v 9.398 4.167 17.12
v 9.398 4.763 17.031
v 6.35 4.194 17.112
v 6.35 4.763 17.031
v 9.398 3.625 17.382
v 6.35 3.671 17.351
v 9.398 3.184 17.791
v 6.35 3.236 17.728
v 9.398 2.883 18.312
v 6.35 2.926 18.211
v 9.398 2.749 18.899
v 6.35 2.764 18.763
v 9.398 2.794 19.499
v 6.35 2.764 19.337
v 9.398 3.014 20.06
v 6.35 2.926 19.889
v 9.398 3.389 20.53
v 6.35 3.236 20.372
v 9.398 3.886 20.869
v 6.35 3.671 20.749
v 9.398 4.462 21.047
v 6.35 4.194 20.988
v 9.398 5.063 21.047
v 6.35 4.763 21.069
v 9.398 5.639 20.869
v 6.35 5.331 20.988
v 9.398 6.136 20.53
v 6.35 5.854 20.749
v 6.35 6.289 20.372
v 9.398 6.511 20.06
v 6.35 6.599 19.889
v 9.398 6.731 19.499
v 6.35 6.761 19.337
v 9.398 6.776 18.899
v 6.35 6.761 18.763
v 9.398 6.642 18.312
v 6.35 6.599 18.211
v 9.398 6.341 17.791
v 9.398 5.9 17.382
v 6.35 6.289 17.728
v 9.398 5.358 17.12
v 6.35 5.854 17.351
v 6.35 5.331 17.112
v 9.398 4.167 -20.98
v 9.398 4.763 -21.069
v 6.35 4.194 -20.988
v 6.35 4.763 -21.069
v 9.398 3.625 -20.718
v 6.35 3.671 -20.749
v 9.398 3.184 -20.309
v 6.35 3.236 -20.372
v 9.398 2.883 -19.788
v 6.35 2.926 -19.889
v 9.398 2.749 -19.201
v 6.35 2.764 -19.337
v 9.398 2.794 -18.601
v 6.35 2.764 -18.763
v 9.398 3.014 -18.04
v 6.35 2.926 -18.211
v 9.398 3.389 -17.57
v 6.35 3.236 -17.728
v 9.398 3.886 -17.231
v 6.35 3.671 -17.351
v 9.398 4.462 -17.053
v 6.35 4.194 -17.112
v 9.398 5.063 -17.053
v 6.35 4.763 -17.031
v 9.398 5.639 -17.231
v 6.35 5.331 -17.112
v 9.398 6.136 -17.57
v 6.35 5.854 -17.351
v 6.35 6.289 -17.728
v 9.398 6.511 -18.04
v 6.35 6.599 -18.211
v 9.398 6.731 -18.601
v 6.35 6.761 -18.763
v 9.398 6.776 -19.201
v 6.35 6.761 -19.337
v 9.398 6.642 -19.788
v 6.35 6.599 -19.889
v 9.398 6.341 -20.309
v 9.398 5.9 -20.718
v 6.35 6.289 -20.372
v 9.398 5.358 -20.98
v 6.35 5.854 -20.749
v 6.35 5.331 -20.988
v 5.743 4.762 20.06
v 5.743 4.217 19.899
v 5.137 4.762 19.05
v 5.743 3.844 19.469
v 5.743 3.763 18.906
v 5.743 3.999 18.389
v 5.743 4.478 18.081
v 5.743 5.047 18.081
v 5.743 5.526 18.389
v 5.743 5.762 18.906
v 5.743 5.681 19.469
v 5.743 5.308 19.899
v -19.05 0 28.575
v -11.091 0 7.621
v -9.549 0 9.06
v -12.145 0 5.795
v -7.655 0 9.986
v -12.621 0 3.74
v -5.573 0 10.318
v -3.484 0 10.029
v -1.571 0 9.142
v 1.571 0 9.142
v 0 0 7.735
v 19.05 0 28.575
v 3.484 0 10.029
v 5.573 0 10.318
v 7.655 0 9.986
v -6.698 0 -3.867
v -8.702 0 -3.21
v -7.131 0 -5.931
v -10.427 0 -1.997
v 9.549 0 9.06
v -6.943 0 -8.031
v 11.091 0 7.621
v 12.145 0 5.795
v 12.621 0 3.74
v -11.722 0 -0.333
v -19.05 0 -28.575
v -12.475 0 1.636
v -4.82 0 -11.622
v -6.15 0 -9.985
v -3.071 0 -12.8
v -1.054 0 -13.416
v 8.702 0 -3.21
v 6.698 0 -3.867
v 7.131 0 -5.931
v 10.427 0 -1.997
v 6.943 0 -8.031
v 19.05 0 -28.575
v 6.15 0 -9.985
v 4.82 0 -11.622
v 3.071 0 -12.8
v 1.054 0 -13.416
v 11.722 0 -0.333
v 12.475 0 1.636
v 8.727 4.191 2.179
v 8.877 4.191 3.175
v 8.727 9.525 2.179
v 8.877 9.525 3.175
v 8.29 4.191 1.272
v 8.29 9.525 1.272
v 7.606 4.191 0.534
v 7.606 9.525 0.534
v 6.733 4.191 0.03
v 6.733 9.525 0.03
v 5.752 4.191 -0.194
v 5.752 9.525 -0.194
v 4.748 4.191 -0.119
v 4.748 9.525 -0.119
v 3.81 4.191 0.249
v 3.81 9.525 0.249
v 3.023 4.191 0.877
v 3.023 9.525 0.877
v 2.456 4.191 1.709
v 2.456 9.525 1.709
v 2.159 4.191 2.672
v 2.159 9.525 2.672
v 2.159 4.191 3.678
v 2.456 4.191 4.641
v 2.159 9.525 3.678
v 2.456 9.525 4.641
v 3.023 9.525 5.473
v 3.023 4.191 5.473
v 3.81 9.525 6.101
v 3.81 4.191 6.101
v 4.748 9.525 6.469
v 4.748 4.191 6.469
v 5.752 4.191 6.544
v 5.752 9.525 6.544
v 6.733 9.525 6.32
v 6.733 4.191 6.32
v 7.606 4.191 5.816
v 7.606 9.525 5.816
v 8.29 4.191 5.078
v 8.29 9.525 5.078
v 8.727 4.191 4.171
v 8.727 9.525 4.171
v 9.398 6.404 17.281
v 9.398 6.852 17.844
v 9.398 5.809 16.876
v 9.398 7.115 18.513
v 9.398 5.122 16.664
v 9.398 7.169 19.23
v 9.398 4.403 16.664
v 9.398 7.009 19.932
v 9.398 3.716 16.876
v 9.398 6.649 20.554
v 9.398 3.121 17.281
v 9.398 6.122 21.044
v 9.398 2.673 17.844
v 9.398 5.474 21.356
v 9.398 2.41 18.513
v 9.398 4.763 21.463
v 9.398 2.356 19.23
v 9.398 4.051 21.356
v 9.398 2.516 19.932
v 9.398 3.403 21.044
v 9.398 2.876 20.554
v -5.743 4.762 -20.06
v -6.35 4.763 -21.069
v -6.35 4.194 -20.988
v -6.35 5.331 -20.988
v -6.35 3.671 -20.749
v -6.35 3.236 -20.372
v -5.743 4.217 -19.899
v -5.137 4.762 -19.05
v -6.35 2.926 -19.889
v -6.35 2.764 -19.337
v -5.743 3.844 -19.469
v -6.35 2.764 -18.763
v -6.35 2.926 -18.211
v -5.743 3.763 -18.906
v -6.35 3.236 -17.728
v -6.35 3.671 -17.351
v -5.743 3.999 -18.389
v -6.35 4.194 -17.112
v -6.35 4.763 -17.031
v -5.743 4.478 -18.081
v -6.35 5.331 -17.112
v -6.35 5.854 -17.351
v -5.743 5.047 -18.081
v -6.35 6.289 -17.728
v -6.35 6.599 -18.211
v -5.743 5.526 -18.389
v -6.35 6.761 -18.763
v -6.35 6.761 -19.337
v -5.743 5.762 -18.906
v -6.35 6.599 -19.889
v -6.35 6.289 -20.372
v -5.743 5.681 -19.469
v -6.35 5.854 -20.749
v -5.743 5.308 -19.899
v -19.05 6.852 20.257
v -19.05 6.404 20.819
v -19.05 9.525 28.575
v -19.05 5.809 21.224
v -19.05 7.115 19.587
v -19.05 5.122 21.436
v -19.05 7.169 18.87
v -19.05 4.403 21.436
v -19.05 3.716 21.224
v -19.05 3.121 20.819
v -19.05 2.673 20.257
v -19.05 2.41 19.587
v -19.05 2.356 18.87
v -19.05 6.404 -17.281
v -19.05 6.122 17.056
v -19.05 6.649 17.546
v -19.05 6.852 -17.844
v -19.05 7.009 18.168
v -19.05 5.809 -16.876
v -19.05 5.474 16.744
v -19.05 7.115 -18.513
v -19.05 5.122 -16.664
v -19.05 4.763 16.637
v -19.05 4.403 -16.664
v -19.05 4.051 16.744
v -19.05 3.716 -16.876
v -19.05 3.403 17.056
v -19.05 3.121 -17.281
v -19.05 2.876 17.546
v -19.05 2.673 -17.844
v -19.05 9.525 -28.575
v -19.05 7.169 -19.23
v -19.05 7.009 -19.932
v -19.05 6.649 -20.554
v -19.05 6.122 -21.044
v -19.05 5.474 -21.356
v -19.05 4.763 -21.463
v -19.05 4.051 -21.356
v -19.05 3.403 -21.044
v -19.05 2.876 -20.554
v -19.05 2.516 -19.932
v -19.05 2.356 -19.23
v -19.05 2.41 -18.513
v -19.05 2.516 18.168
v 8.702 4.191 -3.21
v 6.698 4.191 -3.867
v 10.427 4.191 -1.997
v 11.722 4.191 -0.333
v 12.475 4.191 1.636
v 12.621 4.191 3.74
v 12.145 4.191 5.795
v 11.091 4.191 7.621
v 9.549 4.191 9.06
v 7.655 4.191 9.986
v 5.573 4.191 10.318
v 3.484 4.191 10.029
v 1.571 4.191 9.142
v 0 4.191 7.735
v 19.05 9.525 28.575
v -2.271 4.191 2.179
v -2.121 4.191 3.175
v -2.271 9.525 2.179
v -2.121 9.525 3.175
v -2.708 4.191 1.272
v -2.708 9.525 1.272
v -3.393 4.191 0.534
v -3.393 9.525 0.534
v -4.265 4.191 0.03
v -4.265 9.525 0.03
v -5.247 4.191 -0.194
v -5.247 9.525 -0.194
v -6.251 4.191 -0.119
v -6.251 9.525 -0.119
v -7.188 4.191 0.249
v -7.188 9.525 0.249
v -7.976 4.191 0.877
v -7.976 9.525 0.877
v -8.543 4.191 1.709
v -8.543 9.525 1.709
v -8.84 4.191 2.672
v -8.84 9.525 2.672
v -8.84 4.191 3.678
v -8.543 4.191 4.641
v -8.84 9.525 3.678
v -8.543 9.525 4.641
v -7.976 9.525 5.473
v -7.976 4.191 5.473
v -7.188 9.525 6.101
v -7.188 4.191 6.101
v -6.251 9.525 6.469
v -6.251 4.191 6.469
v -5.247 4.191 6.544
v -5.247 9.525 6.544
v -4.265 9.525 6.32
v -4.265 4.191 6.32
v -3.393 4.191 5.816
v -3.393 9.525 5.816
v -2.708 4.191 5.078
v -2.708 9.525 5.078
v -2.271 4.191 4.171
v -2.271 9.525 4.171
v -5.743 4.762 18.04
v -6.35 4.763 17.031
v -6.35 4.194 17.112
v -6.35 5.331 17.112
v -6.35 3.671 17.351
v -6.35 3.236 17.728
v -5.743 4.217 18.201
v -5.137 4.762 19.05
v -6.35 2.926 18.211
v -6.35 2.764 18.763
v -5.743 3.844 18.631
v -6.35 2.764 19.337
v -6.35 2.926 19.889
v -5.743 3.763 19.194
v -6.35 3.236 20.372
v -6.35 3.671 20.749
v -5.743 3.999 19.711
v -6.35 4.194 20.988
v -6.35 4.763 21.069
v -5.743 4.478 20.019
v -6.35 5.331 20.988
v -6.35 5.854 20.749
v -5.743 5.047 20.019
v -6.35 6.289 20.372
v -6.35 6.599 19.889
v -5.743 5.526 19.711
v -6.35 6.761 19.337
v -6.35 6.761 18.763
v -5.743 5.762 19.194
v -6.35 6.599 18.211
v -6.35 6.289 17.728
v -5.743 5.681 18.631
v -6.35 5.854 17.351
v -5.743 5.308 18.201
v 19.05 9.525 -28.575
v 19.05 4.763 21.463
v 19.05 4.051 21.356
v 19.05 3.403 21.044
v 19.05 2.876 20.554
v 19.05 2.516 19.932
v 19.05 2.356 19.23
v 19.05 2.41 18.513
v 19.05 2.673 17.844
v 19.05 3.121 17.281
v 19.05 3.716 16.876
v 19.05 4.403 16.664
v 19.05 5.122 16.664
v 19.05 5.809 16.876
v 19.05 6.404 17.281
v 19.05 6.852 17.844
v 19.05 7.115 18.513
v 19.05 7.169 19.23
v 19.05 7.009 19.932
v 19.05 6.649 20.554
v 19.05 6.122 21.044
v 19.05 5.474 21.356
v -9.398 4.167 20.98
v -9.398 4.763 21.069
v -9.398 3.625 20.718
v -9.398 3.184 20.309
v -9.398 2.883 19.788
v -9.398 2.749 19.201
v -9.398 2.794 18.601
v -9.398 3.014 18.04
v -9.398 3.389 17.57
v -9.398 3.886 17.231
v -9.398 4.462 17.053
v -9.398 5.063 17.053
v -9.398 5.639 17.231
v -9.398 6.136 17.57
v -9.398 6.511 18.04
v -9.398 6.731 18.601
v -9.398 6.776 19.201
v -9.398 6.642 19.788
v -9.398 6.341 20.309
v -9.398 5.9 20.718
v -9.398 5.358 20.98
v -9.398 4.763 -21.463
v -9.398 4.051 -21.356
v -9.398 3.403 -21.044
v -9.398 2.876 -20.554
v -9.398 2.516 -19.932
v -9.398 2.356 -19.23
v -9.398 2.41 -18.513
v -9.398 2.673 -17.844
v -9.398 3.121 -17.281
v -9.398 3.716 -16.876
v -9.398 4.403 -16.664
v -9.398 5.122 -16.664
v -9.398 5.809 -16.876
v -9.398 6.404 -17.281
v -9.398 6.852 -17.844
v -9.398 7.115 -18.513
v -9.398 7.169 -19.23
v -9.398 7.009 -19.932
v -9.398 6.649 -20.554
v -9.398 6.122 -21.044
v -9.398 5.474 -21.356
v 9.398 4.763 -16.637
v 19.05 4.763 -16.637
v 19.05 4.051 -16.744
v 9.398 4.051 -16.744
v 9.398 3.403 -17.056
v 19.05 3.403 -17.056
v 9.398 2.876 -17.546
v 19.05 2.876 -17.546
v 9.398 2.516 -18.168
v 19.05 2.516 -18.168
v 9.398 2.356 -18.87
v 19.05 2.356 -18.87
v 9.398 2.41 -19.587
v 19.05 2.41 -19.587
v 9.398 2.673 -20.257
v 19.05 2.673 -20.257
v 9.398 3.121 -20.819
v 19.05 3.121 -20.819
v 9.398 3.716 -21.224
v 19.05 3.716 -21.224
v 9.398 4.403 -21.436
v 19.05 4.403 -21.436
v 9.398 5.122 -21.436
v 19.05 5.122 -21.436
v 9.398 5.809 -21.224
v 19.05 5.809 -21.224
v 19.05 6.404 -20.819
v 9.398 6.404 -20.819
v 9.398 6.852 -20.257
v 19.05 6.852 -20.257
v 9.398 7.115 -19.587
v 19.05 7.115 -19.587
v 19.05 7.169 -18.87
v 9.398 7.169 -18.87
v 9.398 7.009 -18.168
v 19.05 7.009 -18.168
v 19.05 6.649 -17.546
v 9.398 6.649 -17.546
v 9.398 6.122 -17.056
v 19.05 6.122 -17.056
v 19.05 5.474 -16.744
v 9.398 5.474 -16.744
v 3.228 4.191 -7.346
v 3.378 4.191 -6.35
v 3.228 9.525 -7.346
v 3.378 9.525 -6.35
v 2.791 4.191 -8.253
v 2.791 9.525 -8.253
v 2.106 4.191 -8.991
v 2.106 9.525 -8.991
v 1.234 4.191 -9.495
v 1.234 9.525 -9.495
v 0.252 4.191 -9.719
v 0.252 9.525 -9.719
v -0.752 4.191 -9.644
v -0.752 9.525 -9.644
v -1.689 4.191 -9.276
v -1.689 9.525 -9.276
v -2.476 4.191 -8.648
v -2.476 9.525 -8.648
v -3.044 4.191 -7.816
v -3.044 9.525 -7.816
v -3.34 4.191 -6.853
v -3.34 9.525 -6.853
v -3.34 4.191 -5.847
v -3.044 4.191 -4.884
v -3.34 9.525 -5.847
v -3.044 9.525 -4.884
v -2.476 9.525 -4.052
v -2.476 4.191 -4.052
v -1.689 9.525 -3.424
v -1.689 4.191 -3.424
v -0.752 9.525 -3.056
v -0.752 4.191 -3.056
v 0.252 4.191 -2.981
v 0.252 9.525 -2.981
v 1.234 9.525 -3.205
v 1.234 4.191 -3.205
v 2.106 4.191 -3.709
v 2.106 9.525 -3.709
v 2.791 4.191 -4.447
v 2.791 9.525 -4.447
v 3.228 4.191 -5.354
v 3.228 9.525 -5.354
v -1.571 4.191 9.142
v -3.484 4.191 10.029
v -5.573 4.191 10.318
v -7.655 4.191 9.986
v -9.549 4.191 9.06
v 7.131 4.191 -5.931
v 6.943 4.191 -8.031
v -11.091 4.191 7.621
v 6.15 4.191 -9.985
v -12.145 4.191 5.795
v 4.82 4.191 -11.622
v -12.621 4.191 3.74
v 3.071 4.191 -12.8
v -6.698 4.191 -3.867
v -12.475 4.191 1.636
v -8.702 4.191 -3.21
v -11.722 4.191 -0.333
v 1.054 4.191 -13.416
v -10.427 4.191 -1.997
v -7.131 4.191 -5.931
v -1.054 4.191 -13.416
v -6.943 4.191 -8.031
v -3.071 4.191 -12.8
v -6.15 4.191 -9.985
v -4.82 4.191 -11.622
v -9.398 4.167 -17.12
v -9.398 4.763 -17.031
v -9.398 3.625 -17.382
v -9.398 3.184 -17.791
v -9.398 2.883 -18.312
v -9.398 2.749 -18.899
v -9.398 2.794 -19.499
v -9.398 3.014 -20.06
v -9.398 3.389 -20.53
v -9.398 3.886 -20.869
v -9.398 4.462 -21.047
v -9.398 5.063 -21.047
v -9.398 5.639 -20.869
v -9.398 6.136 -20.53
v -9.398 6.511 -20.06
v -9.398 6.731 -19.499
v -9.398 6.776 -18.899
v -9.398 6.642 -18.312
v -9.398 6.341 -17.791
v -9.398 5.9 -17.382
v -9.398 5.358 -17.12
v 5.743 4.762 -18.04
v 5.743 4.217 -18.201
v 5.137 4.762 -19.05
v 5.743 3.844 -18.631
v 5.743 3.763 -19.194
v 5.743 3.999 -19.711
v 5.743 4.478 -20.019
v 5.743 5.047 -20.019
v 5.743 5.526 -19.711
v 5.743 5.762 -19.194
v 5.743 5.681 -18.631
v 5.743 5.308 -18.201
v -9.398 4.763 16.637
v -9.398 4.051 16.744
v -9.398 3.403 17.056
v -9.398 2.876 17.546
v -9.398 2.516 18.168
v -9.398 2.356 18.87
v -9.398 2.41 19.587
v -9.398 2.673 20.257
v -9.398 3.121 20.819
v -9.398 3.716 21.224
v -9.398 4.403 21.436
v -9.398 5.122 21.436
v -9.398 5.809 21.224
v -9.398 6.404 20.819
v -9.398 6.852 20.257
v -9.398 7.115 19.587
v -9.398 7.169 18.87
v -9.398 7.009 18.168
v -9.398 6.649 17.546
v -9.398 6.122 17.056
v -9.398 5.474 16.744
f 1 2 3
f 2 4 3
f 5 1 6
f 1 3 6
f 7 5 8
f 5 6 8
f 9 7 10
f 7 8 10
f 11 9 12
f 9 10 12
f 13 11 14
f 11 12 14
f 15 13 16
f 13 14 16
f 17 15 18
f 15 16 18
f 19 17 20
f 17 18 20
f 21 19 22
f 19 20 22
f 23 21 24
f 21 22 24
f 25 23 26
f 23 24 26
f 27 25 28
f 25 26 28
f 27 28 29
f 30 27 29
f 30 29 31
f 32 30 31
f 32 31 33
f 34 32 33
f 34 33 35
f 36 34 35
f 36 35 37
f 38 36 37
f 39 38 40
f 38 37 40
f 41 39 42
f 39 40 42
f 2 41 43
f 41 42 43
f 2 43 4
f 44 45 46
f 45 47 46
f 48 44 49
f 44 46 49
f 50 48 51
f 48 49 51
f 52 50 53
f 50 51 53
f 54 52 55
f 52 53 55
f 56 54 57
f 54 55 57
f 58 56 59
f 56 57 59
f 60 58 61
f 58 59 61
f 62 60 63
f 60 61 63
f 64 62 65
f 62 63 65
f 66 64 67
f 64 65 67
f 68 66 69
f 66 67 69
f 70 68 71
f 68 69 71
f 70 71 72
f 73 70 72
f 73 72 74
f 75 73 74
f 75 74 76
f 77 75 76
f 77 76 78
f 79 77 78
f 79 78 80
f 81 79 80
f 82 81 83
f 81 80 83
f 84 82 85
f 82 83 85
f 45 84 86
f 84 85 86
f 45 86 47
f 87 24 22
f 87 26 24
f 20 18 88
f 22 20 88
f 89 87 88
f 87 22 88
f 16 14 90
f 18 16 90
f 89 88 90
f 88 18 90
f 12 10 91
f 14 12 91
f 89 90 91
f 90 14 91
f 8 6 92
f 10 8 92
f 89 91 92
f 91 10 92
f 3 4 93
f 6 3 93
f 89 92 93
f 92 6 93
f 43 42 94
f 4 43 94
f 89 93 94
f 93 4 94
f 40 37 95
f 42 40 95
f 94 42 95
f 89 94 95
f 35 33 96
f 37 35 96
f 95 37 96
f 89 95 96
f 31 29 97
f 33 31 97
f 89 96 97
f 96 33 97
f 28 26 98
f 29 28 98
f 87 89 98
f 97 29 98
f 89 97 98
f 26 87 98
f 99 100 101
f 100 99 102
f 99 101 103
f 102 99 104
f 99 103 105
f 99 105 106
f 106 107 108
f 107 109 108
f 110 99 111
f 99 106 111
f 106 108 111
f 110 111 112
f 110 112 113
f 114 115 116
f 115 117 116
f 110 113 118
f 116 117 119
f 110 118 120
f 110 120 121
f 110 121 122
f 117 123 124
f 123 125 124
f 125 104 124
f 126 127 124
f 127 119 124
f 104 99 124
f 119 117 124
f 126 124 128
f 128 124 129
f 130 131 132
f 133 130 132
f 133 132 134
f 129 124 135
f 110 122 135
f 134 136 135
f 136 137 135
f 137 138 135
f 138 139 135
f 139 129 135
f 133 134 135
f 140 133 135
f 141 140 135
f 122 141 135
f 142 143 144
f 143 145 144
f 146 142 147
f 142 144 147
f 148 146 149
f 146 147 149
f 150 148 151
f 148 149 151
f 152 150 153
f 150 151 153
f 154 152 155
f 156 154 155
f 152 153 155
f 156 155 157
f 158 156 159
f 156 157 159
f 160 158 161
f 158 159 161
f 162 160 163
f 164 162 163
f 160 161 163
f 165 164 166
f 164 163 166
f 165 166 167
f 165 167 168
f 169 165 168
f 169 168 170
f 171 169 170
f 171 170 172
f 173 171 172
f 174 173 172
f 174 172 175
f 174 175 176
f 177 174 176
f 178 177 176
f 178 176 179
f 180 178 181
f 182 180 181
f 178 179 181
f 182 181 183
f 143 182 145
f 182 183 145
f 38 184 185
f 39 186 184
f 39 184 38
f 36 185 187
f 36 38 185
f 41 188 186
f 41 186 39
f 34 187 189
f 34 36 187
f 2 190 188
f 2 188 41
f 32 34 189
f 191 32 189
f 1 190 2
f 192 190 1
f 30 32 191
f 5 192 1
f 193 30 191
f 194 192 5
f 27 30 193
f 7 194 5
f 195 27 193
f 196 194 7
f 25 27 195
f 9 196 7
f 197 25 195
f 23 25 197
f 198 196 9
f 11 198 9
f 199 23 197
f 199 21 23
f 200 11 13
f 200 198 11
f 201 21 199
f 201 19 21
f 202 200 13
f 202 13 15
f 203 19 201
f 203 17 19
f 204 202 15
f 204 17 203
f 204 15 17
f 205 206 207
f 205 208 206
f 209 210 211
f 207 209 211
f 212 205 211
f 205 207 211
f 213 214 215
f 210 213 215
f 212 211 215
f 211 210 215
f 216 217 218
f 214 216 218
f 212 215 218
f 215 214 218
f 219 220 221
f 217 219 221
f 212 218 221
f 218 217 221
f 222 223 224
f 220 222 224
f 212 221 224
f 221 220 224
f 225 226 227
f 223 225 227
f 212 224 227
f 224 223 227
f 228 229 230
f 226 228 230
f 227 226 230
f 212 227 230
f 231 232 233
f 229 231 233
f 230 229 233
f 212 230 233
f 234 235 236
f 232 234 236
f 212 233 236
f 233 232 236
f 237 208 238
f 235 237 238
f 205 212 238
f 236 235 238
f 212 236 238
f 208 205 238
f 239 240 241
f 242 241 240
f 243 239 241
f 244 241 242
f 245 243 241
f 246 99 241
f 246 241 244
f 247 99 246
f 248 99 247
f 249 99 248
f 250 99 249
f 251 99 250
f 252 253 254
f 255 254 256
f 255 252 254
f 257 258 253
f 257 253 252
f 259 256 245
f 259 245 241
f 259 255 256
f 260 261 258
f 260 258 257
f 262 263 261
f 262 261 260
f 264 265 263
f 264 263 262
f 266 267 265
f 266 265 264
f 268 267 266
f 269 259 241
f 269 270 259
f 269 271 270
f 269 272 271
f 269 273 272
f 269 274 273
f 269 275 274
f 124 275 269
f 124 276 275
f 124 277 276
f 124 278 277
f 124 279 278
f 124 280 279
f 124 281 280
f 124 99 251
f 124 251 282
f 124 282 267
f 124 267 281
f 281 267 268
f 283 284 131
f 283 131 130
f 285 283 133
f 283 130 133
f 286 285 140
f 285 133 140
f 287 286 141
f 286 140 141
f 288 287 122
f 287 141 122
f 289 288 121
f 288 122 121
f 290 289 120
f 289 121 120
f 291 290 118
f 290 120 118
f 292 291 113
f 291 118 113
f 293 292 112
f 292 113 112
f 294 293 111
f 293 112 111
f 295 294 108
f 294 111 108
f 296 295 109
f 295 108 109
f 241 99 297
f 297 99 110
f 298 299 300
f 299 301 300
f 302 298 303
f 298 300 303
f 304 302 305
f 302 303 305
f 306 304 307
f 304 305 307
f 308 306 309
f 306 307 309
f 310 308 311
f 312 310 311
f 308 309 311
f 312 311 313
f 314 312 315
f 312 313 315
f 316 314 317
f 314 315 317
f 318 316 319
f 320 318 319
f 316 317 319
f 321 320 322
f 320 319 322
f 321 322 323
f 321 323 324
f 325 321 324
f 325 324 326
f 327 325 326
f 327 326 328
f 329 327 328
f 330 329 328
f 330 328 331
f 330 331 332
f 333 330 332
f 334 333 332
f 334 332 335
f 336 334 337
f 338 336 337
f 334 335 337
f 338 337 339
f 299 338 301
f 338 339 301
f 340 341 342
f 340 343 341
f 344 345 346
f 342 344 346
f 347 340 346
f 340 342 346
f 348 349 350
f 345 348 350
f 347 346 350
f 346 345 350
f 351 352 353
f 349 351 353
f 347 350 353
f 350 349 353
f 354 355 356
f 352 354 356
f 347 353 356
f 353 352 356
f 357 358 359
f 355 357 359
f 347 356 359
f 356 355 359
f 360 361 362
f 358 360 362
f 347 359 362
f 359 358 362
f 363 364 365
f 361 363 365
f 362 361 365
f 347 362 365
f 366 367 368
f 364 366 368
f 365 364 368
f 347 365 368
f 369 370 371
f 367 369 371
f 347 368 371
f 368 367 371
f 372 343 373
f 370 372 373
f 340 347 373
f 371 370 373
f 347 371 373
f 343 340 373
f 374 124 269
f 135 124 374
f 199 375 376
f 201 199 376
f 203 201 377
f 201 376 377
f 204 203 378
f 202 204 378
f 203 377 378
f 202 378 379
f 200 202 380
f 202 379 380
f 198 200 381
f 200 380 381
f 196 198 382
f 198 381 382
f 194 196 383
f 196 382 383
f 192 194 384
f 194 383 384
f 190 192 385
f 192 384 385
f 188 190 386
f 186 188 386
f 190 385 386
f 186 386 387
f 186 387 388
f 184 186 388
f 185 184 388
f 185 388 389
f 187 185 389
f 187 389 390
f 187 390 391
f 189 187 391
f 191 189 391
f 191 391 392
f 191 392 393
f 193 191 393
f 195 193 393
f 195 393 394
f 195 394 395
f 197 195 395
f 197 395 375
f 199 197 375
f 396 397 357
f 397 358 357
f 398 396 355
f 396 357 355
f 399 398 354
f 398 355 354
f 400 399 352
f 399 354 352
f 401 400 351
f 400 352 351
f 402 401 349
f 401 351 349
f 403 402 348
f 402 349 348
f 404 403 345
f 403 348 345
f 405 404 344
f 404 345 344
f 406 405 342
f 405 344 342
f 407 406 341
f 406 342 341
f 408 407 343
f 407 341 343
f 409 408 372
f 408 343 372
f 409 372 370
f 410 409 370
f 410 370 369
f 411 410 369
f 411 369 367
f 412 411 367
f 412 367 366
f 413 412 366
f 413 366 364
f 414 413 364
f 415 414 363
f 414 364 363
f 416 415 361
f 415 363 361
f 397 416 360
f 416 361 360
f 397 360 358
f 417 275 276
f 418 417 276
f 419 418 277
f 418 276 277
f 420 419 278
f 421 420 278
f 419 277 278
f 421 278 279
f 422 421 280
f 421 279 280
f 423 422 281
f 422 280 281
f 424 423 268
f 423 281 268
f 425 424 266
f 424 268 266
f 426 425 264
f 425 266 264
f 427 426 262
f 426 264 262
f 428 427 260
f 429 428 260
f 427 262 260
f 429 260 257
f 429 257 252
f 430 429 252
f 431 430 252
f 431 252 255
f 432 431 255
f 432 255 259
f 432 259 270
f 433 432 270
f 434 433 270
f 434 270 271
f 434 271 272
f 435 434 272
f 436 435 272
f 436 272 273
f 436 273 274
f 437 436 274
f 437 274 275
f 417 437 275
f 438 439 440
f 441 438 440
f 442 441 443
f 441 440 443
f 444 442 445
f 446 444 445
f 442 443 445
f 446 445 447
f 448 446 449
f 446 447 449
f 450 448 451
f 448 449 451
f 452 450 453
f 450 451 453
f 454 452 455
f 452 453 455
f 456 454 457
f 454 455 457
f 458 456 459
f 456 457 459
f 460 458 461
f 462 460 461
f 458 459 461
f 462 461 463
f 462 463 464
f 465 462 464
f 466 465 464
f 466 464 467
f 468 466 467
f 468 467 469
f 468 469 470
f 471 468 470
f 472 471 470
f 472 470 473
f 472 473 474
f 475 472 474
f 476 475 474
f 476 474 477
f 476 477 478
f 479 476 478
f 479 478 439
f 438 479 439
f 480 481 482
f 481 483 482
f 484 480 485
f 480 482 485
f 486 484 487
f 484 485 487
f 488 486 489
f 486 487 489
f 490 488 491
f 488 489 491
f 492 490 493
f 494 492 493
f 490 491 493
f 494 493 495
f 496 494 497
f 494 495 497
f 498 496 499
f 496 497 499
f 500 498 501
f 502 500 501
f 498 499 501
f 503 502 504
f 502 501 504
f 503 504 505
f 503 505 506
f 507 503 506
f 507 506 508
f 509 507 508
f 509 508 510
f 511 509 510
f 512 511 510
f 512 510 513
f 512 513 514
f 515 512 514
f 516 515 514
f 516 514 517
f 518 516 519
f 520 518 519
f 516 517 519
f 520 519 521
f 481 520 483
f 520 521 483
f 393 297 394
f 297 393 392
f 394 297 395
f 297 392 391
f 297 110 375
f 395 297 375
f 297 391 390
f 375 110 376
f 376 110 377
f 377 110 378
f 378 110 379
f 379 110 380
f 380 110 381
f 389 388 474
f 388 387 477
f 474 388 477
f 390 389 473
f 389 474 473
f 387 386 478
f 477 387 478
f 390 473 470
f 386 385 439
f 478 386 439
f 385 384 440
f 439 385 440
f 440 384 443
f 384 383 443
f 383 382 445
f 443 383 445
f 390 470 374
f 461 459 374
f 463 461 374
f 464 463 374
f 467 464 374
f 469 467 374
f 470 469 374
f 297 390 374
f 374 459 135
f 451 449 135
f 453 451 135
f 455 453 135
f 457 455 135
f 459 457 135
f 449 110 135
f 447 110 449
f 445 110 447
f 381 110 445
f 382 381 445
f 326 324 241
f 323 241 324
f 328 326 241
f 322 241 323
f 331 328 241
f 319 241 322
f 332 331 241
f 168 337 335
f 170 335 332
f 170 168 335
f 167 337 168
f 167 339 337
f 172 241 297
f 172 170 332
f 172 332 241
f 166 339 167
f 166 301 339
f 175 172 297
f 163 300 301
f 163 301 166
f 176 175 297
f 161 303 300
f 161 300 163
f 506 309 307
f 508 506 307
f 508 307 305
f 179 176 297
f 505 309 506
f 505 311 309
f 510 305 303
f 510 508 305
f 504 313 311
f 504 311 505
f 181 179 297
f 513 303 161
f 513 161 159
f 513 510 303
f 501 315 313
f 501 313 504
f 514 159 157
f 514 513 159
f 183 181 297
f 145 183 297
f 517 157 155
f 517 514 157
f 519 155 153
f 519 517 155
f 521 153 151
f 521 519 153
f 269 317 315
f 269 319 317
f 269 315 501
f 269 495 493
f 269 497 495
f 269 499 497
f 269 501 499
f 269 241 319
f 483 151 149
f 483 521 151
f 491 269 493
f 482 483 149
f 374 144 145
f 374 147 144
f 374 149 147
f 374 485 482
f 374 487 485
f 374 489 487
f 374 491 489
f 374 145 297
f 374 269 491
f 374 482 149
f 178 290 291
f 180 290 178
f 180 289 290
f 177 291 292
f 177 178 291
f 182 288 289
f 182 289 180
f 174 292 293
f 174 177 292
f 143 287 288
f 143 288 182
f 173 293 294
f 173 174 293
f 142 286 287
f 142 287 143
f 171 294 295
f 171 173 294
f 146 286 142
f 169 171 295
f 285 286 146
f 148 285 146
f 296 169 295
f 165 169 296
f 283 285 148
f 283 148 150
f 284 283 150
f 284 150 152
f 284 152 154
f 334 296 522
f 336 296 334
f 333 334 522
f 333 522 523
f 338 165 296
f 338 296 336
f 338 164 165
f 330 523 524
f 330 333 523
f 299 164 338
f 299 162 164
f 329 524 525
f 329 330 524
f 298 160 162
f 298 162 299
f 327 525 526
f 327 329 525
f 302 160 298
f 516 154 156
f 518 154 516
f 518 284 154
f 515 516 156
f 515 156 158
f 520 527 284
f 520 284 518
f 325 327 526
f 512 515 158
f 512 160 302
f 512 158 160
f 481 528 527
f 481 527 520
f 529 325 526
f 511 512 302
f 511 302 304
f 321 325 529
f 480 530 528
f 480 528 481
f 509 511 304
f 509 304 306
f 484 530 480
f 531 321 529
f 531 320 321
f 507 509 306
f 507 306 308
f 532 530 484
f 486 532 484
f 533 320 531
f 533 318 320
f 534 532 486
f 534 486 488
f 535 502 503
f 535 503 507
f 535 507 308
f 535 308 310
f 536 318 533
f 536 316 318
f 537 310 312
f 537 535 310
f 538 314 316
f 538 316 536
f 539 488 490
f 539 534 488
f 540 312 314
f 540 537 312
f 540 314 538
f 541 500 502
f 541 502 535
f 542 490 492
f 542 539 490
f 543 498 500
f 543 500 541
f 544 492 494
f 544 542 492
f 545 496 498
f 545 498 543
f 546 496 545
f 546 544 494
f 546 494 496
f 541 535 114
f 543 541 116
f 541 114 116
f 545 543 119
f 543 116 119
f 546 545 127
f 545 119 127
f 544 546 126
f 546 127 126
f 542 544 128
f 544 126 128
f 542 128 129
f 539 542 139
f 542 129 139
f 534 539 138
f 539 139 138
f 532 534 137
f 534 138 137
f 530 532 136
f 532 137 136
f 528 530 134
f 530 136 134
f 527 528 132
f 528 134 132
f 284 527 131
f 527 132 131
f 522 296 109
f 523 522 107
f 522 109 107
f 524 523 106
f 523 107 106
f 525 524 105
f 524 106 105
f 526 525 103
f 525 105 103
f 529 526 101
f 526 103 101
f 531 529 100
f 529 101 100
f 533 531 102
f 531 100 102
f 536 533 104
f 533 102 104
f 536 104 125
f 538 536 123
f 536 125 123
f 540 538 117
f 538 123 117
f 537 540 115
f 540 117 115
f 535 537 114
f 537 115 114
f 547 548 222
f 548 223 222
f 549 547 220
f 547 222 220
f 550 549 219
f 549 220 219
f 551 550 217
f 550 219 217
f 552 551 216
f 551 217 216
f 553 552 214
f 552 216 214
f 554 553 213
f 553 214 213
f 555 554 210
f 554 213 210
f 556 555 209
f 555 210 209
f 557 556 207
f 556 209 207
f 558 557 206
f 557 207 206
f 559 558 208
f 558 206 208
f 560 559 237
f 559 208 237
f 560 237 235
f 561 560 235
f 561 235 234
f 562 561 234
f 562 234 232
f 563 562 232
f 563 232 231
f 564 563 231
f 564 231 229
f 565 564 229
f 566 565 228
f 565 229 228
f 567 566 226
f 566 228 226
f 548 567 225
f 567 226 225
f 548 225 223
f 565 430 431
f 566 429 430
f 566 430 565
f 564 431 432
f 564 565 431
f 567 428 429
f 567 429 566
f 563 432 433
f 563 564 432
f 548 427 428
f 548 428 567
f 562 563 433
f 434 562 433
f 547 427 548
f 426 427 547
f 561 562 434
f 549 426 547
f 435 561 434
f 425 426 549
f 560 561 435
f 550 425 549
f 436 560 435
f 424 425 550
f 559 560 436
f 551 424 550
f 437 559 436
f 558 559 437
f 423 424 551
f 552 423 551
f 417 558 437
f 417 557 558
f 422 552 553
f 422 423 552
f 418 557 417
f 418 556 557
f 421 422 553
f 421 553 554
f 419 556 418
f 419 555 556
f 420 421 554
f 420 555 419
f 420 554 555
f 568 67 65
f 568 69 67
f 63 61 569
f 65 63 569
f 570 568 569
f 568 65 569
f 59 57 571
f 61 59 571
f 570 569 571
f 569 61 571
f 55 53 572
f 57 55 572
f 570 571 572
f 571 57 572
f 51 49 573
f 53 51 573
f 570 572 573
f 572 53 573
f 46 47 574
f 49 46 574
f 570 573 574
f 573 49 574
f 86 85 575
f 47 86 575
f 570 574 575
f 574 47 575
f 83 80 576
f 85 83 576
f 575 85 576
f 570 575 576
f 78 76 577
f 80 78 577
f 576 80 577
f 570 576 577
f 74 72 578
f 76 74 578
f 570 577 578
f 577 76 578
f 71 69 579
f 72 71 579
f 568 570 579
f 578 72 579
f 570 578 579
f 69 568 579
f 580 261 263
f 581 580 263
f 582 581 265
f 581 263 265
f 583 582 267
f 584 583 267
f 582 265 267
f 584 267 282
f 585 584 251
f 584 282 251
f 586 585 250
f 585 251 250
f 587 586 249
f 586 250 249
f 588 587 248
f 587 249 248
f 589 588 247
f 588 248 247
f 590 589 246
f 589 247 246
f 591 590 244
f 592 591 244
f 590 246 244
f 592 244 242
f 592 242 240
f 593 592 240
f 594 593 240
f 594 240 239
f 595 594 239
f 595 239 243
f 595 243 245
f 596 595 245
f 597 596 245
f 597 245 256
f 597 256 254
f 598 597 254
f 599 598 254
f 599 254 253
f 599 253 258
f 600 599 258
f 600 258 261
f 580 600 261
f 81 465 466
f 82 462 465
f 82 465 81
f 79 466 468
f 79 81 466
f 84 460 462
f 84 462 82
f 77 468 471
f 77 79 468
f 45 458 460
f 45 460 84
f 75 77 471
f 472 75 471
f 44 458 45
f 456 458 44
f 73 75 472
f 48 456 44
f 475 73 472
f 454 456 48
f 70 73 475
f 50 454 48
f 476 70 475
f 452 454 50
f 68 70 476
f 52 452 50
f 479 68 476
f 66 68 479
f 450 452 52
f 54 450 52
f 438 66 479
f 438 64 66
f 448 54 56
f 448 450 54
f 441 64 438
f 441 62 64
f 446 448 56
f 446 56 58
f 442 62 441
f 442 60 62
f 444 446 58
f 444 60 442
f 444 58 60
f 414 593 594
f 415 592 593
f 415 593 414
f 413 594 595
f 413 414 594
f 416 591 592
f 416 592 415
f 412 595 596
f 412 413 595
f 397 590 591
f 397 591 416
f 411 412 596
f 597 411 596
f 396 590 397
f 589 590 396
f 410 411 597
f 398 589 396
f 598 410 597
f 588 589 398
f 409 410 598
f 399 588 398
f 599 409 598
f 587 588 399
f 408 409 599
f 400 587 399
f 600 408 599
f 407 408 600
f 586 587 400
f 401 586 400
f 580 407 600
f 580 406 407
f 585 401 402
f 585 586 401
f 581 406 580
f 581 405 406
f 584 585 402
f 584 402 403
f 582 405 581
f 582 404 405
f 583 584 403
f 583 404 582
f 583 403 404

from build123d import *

# Parameters (mm, degrees)
SKETCH1_W                                            = 38.1
SKETCH1_H                                            = 57.15
BOSS_EXTRUDE1_DEPTH                                  = 9.525
CBORE_FOR_1_4_BINDING_HEAD_MACHINE_SCREW_D           = 6.7564
CBORE_FOR_1_4_BINDING_HEAD_MACHINE_SCREW_CBORE_D     = 14.2875
CBORE_FOR_1_4_BINDING_HEAD_MACHINE_SCREW_CBORE_DEPTH = 4.191
F_10_32_TAPPED_HOLE1_D                               = 4.0386
F_10_32_TAPPED_HOLE1_DEPTH                           = 12.7
F_10_32_TAPPED_HOLE1_CBORE_D                         = 4.826
F_10_32_TAPPED_HOLE1_CBORE_DEPTH                     = 9.652
F_10_32_TAPPED_HOLE1_TIP                             = 1.213317848
F_10_32_TAPPED_HOLE1_ON_FACE_2_D                     = 4.0386
F_10_32_TAPPED_HOLE1_ON_FACE_2_DEPTH                 = 12.7
F_10_32_TAPPED_HOLE1_ON_FACE_2_CBORE_D               = 4.826
F_10_32_TAPPED_HOLE1_ON_FACE_2_CBORE_DEPTH           = 9.652
F_10_32_TAPPED_HOLE1_ON_FACE_2_TIP                   = 1.213317848


with BuildPart() as part:
    # Sketch1 → Boss-Extrude1 (new body)
    with BuildSketch(Plane(origin=(0, 0, 0), x_dir=(1, 0, 0), z_dir=(0, 1, 0))):
        Rectangle(SKETCH1_W, SKETCH1_H)
    extrude(amount=BOSS_EXTRUDE1_DEPTH)

    # CBORE for 1/4 Binding Head Machine Screw1 (through all)
    with Locations(Plane(origin=(0, 0, 0), x_dir=(-1, 0, 0), z_dir=(0, -1, 0))):
        with Locations((0, 6.35), (5.499261314, -3.175), (-5.499261314, -3.175)):
            CounterBoreHole(CBORE_FOR_1_4_BINDING_HEAD_MACHINE_SCREW_D / 2, CBORE_FOR_1_4_BINDING_HEAD_MACHINE_SCREW_CBORE_D / 2, CBORE_FOR_1_4_BINDING_HEAD_MACHINE_SCREW_CBORE_DEPTH)

    # #10-32 Tapped Hole1
    with Locations(Plane(origin=(-19.05, 4.7625, -19.05), x_dir=(0, 0, -1), z_dir=(-1, 0, 0))):
        with Locations((0, 0), (-38.1, 0)):
            CounterBoreHole(F_10_32_TAPPED_HOLE1_D / 2, F_10_32_TAPPED_HOLE1_CBORE_D / 2, F_10_32_TAPPED_HOLE1_CBORE_DEPTH, depth=F_10_32_TAPPED_HOLE1_DEPTH)
            with Locations((0, 0, -(F_10_32_TAPPED_HOLE1_DEPTH + F_10_32_TAPPED_HOLE1_TIP / 2))):  # 118° drill point
                Cone(0, F_10_32_TAPPED_HOLE1_D / 2, F_10_32_TAPPED_HOLE1_TIP, mode=Mode.SUBTRACT)

    # #10-32 Tapped Hole1 on face 2
    with Locations(Plane(origin=(19.05, 4.7625, 19.05), x_dir=(0, 0, 1), z_dir=(1, 0, 0))):
        with Locations((0, 0), (-38.1, 0)):
            CounterBoreHole(F_10_32_TAPPED_HOLE1_ON_FACE_2_D / 2, F_10_32_TAPPED_HOLE1_ON_FACE_2_CBORE_D / 2, F_10_32_TAPPED_HOLE1_ON_FACE_2_CBORE_DEPTH, depth=F_10_32_TAPPED_HOLE1_ON_FACE_2_DEPTH)
            with Locations((0, 0, -(F_10_32_TAPPED_HOLE1_ON_FACE_2_DEPTH + F_10_32_TAPPED_HOLE1_ON_FACE_2_TIP / 2))):  # 118° drill point
                Cone(0, F_10_32_TAPPED_HOLE1_ON_FACE_2_D / 2, F_10_32_TAPPED_HOLE1_ON_FACE_2_TIP, mode=Mode.SUBTRACT)


solid = part.part
